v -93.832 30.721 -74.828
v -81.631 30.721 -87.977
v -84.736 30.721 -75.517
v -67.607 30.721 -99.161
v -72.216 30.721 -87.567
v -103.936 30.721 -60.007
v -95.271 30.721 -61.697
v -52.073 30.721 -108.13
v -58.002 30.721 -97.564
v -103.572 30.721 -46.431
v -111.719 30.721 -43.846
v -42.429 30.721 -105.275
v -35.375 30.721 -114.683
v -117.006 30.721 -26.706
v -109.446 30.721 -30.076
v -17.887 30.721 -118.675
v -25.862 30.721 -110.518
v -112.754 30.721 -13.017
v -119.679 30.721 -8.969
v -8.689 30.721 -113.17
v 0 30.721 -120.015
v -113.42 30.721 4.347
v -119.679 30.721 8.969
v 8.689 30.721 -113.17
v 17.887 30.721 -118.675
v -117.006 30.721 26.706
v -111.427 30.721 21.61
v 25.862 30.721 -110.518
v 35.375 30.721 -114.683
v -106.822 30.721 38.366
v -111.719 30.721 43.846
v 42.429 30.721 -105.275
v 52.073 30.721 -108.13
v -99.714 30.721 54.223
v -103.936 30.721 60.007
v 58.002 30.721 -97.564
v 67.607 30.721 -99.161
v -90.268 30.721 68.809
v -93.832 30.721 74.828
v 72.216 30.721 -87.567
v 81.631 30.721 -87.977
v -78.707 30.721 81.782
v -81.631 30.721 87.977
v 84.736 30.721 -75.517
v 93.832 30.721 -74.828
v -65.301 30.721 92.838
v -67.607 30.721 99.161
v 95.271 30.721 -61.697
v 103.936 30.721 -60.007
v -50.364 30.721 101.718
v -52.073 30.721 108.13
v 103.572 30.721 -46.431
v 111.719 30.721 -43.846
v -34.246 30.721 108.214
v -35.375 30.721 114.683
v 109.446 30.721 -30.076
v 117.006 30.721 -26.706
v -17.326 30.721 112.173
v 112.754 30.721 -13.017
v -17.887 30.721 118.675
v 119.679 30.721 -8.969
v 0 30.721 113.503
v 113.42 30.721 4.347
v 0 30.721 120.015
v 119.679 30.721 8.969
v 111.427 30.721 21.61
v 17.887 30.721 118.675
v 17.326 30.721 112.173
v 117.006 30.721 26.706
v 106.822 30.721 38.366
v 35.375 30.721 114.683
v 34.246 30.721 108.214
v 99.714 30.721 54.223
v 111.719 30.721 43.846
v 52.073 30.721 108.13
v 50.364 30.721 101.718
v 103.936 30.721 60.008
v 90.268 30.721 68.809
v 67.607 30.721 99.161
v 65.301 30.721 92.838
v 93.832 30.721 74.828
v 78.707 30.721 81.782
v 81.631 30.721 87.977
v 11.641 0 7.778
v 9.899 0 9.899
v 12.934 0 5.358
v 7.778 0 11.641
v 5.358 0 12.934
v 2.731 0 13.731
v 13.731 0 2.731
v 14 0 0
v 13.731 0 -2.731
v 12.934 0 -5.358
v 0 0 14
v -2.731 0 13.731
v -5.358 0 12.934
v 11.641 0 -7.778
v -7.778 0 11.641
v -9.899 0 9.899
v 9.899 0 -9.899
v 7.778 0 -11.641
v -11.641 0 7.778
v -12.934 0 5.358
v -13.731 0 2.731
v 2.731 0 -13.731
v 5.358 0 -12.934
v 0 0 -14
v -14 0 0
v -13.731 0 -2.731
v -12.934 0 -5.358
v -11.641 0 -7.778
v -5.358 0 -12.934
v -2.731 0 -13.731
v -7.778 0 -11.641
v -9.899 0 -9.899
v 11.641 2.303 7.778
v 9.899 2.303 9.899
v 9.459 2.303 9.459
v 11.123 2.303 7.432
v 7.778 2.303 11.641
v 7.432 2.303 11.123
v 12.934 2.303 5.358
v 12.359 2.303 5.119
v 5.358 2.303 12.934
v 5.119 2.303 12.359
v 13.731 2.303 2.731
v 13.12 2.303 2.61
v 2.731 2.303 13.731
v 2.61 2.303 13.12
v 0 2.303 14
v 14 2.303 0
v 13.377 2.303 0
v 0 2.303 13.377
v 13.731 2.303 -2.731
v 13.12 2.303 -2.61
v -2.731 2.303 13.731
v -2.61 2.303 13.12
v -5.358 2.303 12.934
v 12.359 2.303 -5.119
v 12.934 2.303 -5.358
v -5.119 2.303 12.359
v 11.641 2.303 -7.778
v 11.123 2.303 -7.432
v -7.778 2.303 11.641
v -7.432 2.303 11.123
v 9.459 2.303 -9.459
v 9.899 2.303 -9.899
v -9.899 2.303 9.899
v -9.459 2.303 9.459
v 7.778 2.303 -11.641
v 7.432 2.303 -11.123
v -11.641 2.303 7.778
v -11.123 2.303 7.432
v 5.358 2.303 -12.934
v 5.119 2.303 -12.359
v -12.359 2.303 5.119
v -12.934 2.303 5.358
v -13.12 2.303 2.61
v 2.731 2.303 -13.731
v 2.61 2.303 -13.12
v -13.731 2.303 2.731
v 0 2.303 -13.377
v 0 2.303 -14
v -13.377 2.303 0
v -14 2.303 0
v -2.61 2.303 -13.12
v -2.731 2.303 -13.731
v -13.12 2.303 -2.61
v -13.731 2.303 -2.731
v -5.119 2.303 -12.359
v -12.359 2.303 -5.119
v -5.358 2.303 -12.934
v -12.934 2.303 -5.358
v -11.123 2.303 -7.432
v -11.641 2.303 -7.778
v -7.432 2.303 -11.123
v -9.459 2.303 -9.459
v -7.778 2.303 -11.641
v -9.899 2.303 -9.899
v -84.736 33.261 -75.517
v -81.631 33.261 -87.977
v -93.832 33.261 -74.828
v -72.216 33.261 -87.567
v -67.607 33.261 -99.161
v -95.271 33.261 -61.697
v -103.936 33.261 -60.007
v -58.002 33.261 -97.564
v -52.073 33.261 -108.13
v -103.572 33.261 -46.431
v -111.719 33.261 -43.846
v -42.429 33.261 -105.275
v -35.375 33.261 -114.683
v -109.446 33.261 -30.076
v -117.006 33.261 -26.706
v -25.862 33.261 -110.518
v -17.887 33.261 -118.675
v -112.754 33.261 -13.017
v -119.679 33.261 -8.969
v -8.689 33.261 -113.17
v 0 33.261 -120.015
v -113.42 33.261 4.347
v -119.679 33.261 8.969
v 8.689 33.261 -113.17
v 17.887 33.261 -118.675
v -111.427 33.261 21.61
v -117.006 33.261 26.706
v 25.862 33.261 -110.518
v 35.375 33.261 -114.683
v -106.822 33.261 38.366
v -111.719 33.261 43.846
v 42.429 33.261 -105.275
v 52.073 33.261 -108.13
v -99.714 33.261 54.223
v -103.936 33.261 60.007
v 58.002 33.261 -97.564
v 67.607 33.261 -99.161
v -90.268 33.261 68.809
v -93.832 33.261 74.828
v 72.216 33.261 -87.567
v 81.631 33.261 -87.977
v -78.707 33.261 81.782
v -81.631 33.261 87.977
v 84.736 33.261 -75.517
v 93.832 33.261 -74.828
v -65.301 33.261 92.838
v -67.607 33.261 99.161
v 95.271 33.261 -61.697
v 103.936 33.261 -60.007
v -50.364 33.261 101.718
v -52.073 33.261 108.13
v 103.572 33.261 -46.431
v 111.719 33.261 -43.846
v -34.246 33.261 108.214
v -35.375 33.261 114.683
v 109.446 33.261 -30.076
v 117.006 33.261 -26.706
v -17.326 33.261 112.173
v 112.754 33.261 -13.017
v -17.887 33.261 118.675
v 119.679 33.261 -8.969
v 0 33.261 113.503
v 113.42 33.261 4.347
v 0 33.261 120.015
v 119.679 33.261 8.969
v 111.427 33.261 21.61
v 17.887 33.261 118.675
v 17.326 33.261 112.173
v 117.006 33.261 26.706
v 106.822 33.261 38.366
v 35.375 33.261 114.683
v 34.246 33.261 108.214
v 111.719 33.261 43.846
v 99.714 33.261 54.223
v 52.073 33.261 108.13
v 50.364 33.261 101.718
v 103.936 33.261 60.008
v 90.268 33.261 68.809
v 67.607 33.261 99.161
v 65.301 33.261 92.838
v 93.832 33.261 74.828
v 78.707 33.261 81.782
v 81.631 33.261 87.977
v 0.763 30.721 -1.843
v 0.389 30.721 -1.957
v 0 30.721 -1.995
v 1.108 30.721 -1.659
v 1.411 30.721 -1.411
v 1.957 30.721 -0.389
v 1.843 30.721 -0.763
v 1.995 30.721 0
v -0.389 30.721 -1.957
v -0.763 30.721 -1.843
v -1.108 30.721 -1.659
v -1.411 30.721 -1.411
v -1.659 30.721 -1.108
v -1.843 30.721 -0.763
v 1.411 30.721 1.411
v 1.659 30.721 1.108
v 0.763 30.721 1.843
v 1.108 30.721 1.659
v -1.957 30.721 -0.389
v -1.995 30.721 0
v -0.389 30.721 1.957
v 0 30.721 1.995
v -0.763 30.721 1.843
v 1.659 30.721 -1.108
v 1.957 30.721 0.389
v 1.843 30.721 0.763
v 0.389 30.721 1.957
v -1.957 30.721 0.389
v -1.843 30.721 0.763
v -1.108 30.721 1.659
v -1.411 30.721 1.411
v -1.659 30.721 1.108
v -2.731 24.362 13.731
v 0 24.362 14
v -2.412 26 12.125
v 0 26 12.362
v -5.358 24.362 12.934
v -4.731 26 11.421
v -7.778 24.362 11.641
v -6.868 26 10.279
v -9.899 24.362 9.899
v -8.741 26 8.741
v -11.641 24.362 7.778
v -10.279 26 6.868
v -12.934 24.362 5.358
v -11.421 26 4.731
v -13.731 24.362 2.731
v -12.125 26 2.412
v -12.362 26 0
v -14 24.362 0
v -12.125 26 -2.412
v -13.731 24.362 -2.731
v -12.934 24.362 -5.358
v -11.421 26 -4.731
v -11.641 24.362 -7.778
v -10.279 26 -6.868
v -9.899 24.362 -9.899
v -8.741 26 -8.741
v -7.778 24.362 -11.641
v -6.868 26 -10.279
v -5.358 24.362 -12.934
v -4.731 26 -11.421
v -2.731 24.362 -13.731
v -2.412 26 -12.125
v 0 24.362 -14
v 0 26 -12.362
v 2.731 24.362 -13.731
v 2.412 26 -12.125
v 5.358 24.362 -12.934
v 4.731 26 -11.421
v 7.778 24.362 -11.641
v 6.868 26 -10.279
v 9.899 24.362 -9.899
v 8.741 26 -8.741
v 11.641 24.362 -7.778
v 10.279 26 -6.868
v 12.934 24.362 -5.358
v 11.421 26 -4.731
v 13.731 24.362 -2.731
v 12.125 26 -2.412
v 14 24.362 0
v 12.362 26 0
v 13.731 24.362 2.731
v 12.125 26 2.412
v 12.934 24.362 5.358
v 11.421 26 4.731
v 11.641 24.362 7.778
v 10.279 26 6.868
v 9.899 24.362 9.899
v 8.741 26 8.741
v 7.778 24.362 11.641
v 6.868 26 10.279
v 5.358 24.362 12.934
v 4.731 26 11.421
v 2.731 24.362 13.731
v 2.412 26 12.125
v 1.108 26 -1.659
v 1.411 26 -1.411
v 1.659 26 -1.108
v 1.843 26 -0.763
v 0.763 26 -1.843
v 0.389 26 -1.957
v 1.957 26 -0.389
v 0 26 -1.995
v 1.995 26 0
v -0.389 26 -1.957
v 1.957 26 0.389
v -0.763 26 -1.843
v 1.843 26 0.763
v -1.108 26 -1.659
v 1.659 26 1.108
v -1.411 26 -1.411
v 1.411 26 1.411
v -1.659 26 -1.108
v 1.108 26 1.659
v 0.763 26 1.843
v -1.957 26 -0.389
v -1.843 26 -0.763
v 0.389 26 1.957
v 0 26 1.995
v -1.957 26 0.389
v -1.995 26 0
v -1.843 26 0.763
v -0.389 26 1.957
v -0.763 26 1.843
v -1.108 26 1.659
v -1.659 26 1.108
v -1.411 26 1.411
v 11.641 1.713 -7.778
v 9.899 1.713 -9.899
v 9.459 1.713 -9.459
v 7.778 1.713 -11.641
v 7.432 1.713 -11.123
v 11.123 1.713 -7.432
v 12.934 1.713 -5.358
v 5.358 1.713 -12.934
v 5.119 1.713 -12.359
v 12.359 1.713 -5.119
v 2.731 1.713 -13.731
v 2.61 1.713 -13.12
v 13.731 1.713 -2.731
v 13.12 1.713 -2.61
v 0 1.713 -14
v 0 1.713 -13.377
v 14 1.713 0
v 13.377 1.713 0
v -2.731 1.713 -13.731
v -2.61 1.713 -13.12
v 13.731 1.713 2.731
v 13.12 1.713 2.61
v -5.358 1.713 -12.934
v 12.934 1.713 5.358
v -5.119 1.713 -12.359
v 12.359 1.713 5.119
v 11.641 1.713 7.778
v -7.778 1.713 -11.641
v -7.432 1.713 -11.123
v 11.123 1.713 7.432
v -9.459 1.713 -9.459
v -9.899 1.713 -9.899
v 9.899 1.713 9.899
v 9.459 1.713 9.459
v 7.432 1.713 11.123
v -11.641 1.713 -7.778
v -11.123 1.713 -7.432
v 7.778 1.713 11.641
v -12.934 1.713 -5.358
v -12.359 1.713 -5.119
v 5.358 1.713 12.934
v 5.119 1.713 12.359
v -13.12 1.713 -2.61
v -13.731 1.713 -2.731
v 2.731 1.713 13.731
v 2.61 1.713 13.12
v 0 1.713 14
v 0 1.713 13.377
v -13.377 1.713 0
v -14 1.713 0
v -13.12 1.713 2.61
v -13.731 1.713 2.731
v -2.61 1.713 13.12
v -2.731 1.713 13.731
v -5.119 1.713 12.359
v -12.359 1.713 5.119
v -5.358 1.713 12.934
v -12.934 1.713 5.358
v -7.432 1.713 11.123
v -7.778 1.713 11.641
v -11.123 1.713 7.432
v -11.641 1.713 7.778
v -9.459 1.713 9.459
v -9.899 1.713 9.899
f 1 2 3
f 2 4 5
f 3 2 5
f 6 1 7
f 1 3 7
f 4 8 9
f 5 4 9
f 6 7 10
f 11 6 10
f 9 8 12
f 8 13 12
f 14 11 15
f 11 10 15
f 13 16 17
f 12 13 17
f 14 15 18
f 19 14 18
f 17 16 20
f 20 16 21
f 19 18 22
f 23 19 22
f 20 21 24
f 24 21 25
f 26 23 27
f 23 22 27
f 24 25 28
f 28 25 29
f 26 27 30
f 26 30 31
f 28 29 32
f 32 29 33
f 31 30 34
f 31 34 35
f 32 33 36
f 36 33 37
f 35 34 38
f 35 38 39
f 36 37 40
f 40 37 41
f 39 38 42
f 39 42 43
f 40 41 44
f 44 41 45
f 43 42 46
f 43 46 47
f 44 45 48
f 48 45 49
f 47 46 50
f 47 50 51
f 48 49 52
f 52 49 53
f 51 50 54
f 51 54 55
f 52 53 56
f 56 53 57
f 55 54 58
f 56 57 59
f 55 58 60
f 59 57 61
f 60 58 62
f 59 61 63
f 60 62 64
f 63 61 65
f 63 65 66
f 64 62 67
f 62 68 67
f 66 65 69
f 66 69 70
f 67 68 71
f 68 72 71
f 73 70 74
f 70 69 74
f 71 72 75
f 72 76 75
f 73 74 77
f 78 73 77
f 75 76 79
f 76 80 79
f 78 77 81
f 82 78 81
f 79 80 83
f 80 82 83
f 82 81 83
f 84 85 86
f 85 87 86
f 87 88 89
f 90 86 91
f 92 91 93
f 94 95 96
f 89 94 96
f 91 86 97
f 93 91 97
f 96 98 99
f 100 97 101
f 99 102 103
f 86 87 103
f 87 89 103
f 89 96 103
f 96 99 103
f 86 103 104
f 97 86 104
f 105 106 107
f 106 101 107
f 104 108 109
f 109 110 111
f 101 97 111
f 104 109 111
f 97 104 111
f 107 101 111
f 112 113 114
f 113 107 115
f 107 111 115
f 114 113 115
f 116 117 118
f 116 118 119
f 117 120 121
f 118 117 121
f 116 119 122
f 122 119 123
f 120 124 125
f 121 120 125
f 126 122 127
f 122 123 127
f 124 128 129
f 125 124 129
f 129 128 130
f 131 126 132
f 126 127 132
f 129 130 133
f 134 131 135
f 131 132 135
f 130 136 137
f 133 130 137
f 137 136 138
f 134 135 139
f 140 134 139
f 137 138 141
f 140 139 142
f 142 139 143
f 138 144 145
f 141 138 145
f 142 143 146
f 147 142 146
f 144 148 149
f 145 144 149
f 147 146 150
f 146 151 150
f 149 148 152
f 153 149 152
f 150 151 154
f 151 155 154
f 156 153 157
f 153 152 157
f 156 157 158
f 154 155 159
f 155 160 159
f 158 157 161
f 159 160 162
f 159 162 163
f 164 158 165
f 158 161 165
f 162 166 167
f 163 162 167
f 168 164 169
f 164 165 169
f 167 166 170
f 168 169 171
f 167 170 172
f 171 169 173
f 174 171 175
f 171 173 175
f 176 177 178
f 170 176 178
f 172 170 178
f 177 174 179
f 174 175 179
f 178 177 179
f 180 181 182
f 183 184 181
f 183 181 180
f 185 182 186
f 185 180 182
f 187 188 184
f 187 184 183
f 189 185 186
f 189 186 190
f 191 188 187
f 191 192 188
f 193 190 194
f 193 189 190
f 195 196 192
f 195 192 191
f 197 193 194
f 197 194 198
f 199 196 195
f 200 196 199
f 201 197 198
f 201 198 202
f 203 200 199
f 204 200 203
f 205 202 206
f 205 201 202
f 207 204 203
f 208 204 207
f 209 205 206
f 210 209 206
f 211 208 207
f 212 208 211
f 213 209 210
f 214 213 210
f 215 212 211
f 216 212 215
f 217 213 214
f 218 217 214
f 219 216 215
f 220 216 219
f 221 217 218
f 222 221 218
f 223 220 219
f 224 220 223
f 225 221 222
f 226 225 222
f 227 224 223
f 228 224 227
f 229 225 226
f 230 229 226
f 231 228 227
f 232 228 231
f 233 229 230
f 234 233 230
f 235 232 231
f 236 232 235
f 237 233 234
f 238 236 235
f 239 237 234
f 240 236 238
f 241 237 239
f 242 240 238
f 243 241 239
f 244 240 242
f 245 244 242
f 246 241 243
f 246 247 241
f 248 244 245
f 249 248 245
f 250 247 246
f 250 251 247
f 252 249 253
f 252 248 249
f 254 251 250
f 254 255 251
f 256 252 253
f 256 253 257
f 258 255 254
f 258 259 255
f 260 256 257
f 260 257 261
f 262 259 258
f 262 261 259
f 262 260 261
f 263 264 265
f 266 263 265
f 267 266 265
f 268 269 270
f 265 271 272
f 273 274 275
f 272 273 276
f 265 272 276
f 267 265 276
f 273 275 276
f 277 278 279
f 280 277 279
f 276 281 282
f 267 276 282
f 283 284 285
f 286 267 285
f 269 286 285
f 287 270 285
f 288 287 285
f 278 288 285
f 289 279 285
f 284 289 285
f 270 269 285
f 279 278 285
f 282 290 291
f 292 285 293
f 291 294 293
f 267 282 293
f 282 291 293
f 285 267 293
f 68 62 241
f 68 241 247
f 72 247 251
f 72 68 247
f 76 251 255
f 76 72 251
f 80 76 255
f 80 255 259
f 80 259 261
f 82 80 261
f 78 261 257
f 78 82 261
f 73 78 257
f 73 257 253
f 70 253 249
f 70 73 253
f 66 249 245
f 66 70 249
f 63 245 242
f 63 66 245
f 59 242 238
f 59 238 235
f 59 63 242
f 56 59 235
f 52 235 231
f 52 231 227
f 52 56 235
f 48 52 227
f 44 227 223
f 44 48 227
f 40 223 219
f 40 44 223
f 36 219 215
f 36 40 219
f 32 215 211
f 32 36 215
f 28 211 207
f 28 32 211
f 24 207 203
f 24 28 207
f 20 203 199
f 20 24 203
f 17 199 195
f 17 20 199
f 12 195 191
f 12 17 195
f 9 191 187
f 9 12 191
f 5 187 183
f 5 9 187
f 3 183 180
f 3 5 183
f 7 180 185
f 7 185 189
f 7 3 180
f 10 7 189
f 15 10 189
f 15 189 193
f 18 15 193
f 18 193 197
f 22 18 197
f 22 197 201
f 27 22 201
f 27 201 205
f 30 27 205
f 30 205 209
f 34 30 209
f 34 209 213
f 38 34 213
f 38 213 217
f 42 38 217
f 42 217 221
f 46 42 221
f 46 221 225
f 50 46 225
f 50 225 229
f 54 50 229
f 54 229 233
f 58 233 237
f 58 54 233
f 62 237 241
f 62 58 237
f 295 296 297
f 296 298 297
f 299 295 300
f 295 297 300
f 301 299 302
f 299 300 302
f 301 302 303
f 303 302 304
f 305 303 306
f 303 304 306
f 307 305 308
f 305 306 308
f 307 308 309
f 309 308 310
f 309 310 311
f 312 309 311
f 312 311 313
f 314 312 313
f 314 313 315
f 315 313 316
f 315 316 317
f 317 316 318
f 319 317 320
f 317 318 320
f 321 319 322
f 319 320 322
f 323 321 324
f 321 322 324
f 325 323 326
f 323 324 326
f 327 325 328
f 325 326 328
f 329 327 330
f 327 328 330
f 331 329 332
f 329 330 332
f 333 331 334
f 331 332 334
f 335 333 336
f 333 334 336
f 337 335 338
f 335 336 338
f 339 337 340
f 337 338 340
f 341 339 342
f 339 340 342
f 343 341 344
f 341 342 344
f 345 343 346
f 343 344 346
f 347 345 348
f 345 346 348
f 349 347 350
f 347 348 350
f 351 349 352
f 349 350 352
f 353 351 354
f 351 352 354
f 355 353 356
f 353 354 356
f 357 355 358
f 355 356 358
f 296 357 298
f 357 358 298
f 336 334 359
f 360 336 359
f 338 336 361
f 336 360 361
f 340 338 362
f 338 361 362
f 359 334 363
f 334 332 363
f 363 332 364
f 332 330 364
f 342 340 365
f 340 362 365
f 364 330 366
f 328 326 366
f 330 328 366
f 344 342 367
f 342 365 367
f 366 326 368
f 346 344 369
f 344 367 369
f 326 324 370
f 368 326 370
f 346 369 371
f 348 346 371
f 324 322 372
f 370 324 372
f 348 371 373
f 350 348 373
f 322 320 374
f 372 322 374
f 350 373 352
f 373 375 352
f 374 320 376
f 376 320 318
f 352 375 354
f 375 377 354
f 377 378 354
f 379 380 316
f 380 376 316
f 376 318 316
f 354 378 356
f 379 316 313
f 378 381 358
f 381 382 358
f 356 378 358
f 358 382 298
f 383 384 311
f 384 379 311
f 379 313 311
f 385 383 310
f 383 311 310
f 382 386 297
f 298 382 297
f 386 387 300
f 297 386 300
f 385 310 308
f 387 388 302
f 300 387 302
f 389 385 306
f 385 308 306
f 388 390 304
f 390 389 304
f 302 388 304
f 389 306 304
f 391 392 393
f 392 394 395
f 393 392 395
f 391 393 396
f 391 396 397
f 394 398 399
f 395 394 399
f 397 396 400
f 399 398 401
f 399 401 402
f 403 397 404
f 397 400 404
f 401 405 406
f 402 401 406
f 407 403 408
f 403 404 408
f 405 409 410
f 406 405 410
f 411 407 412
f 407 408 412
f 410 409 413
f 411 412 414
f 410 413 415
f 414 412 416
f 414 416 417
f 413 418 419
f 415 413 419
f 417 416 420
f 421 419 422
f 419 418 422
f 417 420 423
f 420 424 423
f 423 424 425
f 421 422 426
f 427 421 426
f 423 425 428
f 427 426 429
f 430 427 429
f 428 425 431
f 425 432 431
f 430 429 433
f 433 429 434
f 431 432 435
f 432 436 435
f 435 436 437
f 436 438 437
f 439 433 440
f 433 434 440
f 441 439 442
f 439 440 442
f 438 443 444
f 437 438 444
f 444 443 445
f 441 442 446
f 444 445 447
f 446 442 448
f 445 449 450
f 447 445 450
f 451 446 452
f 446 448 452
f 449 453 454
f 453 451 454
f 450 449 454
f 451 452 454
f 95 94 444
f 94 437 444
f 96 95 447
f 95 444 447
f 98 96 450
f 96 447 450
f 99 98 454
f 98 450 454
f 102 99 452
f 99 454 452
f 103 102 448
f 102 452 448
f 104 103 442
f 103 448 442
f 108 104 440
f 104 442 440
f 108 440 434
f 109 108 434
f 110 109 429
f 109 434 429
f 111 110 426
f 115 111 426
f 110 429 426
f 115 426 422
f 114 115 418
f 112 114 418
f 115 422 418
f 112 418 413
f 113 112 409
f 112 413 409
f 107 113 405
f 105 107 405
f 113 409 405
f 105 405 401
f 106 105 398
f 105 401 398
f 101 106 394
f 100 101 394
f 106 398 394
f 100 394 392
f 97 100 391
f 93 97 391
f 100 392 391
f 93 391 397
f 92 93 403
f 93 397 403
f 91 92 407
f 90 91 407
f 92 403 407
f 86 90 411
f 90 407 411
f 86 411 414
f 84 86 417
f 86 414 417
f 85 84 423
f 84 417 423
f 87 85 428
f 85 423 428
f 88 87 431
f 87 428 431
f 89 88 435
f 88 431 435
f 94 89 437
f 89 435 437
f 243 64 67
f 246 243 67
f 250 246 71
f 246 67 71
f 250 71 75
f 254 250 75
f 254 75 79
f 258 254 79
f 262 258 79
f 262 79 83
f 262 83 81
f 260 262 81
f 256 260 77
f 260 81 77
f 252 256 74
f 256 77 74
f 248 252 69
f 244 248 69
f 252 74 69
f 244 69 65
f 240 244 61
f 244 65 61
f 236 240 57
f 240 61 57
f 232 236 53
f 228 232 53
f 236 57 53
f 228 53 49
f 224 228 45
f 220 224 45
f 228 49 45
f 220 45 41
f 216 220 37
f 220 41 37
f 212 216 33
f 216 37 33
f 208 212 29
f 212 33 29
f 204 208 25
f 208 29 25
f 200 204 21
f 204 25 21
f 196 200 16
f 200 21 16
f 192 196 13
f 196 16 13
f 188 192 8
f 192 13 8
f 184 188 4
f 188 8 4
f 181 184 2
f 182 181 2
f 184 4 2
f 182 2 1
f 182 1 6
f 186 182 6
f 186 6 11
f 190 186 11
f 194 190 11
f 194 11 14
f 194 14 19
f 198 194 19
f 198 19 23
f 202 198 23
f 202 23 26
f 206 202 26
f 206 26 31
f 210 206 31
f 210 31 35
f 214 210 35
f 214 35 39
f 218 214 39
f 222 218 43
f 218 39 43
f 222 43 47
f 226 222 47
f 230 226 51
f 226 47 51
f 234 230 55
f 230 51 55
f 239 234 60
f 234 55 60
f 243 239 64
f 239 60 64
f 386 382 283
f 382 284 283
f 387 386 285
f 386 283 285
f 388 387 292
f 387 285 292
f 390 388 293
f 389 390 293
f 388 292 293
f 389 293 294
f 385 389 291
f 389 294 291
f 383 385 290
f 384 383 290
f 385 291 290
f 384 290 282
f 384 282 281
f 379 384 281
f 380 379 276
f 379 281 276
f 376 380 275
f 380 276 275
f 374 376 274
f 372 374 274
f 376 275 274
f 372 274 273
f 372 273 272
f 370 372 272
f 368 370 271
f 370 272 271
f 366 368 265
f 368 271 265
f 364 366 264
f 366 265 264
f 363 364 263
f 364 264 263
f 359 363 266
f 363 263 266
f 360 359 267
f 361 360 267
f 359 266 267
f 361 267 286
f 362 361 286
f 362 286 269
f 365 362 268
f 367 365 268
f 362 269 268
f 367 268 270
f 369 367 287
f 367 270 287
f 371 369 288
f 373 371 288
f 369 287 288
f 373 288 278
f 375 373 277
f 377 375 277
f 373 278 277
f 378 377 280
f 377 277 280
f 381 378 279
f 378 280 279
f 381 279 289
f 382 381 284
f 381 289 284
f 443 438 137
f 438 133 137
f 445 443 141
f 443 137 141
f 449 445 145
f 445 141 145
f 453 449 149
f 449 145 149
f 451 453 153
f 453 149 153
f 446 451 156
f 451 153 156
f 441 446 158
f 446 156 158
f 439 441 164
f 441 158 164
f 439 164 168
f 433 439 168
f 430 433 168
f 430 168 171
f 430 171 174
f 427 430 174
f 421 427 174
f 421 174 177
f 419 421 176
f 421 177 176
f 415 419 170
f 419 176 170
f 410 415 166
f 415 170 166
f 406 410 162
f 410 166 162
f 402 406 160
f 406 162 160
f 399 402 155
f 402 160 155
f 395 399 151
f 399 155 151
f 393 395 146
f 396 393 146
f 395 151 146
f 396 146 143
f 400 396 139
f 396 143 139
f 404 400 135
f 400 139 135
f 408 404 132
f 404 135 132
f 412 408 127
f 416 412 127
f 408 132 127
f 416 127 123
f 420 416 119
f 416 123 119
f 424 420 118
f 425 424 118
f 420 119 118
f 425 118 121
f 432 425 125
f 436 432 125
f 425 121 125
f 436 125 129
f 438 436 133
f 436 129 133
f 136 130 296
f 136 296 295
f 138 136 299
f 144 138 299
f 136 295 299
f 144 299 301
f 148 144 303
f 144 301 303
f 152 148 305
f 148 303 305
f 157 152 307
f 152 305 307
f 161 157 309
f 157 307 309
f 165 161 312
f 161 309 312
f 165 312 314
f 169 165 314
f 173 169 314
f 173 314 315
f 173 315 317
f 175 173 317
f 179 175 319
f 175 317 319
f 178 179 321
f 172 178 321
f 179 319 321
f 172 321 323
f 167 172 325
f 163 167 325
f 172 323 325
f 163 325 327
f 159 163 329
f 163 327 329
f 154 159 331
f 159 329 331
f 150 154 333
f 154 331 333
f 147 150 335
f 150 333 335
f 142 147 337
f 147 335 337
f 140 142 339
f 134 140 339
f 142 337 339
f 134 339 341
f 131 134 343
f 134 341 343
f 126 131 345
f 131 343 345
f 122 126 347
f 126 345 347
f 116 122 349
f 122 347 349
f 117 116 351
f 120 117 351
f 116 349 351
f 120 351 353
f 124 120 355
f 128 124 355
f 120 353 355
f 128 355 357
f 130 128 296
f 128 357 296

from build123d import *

# Parameters (mm, degrees)
SKETCH2_R           = 120.015
SKETCH2_R_2         = 113.503262111
BOSS_EXTRUDE1_DEPTH = 2.54


with BuildPart() as part:
    # Sketch1 → Revolve1 (revolve)
    with BuildSketch(Plane.XY):
        Polygon((0, 0), (14, 0), (14, 1.712753025), (13.377430193, 1.712753025), (13.377430193, 2.303284787), (14, 2.303284787), (14, 24.362224429), (12.362224429, 26), (1.99505291, 26), (1.99505291, 30.72050638), (0, 30.72050638), align=None)
    revolve(axis=Axis((0, 30.72050638, 0), (0, -1, 0)))


with BuildPart() as body_2:
    # Sketch2 → Boss-Extrude1 (new body)
    with BuildSketch(Plane(origin=(0, 30.72050638, 0), x_dir=(1, 0, 0), z_dir=(0, 1, 0))):
        Circle(SKETCH2_R)
        Circle(SKETCH2_R_2, mode=Mode.SUBTRACT)
    extrude(amount=BOSS_EXTRUDE1_DEPTH)


solid = Compound([part.part, body_2.part])
